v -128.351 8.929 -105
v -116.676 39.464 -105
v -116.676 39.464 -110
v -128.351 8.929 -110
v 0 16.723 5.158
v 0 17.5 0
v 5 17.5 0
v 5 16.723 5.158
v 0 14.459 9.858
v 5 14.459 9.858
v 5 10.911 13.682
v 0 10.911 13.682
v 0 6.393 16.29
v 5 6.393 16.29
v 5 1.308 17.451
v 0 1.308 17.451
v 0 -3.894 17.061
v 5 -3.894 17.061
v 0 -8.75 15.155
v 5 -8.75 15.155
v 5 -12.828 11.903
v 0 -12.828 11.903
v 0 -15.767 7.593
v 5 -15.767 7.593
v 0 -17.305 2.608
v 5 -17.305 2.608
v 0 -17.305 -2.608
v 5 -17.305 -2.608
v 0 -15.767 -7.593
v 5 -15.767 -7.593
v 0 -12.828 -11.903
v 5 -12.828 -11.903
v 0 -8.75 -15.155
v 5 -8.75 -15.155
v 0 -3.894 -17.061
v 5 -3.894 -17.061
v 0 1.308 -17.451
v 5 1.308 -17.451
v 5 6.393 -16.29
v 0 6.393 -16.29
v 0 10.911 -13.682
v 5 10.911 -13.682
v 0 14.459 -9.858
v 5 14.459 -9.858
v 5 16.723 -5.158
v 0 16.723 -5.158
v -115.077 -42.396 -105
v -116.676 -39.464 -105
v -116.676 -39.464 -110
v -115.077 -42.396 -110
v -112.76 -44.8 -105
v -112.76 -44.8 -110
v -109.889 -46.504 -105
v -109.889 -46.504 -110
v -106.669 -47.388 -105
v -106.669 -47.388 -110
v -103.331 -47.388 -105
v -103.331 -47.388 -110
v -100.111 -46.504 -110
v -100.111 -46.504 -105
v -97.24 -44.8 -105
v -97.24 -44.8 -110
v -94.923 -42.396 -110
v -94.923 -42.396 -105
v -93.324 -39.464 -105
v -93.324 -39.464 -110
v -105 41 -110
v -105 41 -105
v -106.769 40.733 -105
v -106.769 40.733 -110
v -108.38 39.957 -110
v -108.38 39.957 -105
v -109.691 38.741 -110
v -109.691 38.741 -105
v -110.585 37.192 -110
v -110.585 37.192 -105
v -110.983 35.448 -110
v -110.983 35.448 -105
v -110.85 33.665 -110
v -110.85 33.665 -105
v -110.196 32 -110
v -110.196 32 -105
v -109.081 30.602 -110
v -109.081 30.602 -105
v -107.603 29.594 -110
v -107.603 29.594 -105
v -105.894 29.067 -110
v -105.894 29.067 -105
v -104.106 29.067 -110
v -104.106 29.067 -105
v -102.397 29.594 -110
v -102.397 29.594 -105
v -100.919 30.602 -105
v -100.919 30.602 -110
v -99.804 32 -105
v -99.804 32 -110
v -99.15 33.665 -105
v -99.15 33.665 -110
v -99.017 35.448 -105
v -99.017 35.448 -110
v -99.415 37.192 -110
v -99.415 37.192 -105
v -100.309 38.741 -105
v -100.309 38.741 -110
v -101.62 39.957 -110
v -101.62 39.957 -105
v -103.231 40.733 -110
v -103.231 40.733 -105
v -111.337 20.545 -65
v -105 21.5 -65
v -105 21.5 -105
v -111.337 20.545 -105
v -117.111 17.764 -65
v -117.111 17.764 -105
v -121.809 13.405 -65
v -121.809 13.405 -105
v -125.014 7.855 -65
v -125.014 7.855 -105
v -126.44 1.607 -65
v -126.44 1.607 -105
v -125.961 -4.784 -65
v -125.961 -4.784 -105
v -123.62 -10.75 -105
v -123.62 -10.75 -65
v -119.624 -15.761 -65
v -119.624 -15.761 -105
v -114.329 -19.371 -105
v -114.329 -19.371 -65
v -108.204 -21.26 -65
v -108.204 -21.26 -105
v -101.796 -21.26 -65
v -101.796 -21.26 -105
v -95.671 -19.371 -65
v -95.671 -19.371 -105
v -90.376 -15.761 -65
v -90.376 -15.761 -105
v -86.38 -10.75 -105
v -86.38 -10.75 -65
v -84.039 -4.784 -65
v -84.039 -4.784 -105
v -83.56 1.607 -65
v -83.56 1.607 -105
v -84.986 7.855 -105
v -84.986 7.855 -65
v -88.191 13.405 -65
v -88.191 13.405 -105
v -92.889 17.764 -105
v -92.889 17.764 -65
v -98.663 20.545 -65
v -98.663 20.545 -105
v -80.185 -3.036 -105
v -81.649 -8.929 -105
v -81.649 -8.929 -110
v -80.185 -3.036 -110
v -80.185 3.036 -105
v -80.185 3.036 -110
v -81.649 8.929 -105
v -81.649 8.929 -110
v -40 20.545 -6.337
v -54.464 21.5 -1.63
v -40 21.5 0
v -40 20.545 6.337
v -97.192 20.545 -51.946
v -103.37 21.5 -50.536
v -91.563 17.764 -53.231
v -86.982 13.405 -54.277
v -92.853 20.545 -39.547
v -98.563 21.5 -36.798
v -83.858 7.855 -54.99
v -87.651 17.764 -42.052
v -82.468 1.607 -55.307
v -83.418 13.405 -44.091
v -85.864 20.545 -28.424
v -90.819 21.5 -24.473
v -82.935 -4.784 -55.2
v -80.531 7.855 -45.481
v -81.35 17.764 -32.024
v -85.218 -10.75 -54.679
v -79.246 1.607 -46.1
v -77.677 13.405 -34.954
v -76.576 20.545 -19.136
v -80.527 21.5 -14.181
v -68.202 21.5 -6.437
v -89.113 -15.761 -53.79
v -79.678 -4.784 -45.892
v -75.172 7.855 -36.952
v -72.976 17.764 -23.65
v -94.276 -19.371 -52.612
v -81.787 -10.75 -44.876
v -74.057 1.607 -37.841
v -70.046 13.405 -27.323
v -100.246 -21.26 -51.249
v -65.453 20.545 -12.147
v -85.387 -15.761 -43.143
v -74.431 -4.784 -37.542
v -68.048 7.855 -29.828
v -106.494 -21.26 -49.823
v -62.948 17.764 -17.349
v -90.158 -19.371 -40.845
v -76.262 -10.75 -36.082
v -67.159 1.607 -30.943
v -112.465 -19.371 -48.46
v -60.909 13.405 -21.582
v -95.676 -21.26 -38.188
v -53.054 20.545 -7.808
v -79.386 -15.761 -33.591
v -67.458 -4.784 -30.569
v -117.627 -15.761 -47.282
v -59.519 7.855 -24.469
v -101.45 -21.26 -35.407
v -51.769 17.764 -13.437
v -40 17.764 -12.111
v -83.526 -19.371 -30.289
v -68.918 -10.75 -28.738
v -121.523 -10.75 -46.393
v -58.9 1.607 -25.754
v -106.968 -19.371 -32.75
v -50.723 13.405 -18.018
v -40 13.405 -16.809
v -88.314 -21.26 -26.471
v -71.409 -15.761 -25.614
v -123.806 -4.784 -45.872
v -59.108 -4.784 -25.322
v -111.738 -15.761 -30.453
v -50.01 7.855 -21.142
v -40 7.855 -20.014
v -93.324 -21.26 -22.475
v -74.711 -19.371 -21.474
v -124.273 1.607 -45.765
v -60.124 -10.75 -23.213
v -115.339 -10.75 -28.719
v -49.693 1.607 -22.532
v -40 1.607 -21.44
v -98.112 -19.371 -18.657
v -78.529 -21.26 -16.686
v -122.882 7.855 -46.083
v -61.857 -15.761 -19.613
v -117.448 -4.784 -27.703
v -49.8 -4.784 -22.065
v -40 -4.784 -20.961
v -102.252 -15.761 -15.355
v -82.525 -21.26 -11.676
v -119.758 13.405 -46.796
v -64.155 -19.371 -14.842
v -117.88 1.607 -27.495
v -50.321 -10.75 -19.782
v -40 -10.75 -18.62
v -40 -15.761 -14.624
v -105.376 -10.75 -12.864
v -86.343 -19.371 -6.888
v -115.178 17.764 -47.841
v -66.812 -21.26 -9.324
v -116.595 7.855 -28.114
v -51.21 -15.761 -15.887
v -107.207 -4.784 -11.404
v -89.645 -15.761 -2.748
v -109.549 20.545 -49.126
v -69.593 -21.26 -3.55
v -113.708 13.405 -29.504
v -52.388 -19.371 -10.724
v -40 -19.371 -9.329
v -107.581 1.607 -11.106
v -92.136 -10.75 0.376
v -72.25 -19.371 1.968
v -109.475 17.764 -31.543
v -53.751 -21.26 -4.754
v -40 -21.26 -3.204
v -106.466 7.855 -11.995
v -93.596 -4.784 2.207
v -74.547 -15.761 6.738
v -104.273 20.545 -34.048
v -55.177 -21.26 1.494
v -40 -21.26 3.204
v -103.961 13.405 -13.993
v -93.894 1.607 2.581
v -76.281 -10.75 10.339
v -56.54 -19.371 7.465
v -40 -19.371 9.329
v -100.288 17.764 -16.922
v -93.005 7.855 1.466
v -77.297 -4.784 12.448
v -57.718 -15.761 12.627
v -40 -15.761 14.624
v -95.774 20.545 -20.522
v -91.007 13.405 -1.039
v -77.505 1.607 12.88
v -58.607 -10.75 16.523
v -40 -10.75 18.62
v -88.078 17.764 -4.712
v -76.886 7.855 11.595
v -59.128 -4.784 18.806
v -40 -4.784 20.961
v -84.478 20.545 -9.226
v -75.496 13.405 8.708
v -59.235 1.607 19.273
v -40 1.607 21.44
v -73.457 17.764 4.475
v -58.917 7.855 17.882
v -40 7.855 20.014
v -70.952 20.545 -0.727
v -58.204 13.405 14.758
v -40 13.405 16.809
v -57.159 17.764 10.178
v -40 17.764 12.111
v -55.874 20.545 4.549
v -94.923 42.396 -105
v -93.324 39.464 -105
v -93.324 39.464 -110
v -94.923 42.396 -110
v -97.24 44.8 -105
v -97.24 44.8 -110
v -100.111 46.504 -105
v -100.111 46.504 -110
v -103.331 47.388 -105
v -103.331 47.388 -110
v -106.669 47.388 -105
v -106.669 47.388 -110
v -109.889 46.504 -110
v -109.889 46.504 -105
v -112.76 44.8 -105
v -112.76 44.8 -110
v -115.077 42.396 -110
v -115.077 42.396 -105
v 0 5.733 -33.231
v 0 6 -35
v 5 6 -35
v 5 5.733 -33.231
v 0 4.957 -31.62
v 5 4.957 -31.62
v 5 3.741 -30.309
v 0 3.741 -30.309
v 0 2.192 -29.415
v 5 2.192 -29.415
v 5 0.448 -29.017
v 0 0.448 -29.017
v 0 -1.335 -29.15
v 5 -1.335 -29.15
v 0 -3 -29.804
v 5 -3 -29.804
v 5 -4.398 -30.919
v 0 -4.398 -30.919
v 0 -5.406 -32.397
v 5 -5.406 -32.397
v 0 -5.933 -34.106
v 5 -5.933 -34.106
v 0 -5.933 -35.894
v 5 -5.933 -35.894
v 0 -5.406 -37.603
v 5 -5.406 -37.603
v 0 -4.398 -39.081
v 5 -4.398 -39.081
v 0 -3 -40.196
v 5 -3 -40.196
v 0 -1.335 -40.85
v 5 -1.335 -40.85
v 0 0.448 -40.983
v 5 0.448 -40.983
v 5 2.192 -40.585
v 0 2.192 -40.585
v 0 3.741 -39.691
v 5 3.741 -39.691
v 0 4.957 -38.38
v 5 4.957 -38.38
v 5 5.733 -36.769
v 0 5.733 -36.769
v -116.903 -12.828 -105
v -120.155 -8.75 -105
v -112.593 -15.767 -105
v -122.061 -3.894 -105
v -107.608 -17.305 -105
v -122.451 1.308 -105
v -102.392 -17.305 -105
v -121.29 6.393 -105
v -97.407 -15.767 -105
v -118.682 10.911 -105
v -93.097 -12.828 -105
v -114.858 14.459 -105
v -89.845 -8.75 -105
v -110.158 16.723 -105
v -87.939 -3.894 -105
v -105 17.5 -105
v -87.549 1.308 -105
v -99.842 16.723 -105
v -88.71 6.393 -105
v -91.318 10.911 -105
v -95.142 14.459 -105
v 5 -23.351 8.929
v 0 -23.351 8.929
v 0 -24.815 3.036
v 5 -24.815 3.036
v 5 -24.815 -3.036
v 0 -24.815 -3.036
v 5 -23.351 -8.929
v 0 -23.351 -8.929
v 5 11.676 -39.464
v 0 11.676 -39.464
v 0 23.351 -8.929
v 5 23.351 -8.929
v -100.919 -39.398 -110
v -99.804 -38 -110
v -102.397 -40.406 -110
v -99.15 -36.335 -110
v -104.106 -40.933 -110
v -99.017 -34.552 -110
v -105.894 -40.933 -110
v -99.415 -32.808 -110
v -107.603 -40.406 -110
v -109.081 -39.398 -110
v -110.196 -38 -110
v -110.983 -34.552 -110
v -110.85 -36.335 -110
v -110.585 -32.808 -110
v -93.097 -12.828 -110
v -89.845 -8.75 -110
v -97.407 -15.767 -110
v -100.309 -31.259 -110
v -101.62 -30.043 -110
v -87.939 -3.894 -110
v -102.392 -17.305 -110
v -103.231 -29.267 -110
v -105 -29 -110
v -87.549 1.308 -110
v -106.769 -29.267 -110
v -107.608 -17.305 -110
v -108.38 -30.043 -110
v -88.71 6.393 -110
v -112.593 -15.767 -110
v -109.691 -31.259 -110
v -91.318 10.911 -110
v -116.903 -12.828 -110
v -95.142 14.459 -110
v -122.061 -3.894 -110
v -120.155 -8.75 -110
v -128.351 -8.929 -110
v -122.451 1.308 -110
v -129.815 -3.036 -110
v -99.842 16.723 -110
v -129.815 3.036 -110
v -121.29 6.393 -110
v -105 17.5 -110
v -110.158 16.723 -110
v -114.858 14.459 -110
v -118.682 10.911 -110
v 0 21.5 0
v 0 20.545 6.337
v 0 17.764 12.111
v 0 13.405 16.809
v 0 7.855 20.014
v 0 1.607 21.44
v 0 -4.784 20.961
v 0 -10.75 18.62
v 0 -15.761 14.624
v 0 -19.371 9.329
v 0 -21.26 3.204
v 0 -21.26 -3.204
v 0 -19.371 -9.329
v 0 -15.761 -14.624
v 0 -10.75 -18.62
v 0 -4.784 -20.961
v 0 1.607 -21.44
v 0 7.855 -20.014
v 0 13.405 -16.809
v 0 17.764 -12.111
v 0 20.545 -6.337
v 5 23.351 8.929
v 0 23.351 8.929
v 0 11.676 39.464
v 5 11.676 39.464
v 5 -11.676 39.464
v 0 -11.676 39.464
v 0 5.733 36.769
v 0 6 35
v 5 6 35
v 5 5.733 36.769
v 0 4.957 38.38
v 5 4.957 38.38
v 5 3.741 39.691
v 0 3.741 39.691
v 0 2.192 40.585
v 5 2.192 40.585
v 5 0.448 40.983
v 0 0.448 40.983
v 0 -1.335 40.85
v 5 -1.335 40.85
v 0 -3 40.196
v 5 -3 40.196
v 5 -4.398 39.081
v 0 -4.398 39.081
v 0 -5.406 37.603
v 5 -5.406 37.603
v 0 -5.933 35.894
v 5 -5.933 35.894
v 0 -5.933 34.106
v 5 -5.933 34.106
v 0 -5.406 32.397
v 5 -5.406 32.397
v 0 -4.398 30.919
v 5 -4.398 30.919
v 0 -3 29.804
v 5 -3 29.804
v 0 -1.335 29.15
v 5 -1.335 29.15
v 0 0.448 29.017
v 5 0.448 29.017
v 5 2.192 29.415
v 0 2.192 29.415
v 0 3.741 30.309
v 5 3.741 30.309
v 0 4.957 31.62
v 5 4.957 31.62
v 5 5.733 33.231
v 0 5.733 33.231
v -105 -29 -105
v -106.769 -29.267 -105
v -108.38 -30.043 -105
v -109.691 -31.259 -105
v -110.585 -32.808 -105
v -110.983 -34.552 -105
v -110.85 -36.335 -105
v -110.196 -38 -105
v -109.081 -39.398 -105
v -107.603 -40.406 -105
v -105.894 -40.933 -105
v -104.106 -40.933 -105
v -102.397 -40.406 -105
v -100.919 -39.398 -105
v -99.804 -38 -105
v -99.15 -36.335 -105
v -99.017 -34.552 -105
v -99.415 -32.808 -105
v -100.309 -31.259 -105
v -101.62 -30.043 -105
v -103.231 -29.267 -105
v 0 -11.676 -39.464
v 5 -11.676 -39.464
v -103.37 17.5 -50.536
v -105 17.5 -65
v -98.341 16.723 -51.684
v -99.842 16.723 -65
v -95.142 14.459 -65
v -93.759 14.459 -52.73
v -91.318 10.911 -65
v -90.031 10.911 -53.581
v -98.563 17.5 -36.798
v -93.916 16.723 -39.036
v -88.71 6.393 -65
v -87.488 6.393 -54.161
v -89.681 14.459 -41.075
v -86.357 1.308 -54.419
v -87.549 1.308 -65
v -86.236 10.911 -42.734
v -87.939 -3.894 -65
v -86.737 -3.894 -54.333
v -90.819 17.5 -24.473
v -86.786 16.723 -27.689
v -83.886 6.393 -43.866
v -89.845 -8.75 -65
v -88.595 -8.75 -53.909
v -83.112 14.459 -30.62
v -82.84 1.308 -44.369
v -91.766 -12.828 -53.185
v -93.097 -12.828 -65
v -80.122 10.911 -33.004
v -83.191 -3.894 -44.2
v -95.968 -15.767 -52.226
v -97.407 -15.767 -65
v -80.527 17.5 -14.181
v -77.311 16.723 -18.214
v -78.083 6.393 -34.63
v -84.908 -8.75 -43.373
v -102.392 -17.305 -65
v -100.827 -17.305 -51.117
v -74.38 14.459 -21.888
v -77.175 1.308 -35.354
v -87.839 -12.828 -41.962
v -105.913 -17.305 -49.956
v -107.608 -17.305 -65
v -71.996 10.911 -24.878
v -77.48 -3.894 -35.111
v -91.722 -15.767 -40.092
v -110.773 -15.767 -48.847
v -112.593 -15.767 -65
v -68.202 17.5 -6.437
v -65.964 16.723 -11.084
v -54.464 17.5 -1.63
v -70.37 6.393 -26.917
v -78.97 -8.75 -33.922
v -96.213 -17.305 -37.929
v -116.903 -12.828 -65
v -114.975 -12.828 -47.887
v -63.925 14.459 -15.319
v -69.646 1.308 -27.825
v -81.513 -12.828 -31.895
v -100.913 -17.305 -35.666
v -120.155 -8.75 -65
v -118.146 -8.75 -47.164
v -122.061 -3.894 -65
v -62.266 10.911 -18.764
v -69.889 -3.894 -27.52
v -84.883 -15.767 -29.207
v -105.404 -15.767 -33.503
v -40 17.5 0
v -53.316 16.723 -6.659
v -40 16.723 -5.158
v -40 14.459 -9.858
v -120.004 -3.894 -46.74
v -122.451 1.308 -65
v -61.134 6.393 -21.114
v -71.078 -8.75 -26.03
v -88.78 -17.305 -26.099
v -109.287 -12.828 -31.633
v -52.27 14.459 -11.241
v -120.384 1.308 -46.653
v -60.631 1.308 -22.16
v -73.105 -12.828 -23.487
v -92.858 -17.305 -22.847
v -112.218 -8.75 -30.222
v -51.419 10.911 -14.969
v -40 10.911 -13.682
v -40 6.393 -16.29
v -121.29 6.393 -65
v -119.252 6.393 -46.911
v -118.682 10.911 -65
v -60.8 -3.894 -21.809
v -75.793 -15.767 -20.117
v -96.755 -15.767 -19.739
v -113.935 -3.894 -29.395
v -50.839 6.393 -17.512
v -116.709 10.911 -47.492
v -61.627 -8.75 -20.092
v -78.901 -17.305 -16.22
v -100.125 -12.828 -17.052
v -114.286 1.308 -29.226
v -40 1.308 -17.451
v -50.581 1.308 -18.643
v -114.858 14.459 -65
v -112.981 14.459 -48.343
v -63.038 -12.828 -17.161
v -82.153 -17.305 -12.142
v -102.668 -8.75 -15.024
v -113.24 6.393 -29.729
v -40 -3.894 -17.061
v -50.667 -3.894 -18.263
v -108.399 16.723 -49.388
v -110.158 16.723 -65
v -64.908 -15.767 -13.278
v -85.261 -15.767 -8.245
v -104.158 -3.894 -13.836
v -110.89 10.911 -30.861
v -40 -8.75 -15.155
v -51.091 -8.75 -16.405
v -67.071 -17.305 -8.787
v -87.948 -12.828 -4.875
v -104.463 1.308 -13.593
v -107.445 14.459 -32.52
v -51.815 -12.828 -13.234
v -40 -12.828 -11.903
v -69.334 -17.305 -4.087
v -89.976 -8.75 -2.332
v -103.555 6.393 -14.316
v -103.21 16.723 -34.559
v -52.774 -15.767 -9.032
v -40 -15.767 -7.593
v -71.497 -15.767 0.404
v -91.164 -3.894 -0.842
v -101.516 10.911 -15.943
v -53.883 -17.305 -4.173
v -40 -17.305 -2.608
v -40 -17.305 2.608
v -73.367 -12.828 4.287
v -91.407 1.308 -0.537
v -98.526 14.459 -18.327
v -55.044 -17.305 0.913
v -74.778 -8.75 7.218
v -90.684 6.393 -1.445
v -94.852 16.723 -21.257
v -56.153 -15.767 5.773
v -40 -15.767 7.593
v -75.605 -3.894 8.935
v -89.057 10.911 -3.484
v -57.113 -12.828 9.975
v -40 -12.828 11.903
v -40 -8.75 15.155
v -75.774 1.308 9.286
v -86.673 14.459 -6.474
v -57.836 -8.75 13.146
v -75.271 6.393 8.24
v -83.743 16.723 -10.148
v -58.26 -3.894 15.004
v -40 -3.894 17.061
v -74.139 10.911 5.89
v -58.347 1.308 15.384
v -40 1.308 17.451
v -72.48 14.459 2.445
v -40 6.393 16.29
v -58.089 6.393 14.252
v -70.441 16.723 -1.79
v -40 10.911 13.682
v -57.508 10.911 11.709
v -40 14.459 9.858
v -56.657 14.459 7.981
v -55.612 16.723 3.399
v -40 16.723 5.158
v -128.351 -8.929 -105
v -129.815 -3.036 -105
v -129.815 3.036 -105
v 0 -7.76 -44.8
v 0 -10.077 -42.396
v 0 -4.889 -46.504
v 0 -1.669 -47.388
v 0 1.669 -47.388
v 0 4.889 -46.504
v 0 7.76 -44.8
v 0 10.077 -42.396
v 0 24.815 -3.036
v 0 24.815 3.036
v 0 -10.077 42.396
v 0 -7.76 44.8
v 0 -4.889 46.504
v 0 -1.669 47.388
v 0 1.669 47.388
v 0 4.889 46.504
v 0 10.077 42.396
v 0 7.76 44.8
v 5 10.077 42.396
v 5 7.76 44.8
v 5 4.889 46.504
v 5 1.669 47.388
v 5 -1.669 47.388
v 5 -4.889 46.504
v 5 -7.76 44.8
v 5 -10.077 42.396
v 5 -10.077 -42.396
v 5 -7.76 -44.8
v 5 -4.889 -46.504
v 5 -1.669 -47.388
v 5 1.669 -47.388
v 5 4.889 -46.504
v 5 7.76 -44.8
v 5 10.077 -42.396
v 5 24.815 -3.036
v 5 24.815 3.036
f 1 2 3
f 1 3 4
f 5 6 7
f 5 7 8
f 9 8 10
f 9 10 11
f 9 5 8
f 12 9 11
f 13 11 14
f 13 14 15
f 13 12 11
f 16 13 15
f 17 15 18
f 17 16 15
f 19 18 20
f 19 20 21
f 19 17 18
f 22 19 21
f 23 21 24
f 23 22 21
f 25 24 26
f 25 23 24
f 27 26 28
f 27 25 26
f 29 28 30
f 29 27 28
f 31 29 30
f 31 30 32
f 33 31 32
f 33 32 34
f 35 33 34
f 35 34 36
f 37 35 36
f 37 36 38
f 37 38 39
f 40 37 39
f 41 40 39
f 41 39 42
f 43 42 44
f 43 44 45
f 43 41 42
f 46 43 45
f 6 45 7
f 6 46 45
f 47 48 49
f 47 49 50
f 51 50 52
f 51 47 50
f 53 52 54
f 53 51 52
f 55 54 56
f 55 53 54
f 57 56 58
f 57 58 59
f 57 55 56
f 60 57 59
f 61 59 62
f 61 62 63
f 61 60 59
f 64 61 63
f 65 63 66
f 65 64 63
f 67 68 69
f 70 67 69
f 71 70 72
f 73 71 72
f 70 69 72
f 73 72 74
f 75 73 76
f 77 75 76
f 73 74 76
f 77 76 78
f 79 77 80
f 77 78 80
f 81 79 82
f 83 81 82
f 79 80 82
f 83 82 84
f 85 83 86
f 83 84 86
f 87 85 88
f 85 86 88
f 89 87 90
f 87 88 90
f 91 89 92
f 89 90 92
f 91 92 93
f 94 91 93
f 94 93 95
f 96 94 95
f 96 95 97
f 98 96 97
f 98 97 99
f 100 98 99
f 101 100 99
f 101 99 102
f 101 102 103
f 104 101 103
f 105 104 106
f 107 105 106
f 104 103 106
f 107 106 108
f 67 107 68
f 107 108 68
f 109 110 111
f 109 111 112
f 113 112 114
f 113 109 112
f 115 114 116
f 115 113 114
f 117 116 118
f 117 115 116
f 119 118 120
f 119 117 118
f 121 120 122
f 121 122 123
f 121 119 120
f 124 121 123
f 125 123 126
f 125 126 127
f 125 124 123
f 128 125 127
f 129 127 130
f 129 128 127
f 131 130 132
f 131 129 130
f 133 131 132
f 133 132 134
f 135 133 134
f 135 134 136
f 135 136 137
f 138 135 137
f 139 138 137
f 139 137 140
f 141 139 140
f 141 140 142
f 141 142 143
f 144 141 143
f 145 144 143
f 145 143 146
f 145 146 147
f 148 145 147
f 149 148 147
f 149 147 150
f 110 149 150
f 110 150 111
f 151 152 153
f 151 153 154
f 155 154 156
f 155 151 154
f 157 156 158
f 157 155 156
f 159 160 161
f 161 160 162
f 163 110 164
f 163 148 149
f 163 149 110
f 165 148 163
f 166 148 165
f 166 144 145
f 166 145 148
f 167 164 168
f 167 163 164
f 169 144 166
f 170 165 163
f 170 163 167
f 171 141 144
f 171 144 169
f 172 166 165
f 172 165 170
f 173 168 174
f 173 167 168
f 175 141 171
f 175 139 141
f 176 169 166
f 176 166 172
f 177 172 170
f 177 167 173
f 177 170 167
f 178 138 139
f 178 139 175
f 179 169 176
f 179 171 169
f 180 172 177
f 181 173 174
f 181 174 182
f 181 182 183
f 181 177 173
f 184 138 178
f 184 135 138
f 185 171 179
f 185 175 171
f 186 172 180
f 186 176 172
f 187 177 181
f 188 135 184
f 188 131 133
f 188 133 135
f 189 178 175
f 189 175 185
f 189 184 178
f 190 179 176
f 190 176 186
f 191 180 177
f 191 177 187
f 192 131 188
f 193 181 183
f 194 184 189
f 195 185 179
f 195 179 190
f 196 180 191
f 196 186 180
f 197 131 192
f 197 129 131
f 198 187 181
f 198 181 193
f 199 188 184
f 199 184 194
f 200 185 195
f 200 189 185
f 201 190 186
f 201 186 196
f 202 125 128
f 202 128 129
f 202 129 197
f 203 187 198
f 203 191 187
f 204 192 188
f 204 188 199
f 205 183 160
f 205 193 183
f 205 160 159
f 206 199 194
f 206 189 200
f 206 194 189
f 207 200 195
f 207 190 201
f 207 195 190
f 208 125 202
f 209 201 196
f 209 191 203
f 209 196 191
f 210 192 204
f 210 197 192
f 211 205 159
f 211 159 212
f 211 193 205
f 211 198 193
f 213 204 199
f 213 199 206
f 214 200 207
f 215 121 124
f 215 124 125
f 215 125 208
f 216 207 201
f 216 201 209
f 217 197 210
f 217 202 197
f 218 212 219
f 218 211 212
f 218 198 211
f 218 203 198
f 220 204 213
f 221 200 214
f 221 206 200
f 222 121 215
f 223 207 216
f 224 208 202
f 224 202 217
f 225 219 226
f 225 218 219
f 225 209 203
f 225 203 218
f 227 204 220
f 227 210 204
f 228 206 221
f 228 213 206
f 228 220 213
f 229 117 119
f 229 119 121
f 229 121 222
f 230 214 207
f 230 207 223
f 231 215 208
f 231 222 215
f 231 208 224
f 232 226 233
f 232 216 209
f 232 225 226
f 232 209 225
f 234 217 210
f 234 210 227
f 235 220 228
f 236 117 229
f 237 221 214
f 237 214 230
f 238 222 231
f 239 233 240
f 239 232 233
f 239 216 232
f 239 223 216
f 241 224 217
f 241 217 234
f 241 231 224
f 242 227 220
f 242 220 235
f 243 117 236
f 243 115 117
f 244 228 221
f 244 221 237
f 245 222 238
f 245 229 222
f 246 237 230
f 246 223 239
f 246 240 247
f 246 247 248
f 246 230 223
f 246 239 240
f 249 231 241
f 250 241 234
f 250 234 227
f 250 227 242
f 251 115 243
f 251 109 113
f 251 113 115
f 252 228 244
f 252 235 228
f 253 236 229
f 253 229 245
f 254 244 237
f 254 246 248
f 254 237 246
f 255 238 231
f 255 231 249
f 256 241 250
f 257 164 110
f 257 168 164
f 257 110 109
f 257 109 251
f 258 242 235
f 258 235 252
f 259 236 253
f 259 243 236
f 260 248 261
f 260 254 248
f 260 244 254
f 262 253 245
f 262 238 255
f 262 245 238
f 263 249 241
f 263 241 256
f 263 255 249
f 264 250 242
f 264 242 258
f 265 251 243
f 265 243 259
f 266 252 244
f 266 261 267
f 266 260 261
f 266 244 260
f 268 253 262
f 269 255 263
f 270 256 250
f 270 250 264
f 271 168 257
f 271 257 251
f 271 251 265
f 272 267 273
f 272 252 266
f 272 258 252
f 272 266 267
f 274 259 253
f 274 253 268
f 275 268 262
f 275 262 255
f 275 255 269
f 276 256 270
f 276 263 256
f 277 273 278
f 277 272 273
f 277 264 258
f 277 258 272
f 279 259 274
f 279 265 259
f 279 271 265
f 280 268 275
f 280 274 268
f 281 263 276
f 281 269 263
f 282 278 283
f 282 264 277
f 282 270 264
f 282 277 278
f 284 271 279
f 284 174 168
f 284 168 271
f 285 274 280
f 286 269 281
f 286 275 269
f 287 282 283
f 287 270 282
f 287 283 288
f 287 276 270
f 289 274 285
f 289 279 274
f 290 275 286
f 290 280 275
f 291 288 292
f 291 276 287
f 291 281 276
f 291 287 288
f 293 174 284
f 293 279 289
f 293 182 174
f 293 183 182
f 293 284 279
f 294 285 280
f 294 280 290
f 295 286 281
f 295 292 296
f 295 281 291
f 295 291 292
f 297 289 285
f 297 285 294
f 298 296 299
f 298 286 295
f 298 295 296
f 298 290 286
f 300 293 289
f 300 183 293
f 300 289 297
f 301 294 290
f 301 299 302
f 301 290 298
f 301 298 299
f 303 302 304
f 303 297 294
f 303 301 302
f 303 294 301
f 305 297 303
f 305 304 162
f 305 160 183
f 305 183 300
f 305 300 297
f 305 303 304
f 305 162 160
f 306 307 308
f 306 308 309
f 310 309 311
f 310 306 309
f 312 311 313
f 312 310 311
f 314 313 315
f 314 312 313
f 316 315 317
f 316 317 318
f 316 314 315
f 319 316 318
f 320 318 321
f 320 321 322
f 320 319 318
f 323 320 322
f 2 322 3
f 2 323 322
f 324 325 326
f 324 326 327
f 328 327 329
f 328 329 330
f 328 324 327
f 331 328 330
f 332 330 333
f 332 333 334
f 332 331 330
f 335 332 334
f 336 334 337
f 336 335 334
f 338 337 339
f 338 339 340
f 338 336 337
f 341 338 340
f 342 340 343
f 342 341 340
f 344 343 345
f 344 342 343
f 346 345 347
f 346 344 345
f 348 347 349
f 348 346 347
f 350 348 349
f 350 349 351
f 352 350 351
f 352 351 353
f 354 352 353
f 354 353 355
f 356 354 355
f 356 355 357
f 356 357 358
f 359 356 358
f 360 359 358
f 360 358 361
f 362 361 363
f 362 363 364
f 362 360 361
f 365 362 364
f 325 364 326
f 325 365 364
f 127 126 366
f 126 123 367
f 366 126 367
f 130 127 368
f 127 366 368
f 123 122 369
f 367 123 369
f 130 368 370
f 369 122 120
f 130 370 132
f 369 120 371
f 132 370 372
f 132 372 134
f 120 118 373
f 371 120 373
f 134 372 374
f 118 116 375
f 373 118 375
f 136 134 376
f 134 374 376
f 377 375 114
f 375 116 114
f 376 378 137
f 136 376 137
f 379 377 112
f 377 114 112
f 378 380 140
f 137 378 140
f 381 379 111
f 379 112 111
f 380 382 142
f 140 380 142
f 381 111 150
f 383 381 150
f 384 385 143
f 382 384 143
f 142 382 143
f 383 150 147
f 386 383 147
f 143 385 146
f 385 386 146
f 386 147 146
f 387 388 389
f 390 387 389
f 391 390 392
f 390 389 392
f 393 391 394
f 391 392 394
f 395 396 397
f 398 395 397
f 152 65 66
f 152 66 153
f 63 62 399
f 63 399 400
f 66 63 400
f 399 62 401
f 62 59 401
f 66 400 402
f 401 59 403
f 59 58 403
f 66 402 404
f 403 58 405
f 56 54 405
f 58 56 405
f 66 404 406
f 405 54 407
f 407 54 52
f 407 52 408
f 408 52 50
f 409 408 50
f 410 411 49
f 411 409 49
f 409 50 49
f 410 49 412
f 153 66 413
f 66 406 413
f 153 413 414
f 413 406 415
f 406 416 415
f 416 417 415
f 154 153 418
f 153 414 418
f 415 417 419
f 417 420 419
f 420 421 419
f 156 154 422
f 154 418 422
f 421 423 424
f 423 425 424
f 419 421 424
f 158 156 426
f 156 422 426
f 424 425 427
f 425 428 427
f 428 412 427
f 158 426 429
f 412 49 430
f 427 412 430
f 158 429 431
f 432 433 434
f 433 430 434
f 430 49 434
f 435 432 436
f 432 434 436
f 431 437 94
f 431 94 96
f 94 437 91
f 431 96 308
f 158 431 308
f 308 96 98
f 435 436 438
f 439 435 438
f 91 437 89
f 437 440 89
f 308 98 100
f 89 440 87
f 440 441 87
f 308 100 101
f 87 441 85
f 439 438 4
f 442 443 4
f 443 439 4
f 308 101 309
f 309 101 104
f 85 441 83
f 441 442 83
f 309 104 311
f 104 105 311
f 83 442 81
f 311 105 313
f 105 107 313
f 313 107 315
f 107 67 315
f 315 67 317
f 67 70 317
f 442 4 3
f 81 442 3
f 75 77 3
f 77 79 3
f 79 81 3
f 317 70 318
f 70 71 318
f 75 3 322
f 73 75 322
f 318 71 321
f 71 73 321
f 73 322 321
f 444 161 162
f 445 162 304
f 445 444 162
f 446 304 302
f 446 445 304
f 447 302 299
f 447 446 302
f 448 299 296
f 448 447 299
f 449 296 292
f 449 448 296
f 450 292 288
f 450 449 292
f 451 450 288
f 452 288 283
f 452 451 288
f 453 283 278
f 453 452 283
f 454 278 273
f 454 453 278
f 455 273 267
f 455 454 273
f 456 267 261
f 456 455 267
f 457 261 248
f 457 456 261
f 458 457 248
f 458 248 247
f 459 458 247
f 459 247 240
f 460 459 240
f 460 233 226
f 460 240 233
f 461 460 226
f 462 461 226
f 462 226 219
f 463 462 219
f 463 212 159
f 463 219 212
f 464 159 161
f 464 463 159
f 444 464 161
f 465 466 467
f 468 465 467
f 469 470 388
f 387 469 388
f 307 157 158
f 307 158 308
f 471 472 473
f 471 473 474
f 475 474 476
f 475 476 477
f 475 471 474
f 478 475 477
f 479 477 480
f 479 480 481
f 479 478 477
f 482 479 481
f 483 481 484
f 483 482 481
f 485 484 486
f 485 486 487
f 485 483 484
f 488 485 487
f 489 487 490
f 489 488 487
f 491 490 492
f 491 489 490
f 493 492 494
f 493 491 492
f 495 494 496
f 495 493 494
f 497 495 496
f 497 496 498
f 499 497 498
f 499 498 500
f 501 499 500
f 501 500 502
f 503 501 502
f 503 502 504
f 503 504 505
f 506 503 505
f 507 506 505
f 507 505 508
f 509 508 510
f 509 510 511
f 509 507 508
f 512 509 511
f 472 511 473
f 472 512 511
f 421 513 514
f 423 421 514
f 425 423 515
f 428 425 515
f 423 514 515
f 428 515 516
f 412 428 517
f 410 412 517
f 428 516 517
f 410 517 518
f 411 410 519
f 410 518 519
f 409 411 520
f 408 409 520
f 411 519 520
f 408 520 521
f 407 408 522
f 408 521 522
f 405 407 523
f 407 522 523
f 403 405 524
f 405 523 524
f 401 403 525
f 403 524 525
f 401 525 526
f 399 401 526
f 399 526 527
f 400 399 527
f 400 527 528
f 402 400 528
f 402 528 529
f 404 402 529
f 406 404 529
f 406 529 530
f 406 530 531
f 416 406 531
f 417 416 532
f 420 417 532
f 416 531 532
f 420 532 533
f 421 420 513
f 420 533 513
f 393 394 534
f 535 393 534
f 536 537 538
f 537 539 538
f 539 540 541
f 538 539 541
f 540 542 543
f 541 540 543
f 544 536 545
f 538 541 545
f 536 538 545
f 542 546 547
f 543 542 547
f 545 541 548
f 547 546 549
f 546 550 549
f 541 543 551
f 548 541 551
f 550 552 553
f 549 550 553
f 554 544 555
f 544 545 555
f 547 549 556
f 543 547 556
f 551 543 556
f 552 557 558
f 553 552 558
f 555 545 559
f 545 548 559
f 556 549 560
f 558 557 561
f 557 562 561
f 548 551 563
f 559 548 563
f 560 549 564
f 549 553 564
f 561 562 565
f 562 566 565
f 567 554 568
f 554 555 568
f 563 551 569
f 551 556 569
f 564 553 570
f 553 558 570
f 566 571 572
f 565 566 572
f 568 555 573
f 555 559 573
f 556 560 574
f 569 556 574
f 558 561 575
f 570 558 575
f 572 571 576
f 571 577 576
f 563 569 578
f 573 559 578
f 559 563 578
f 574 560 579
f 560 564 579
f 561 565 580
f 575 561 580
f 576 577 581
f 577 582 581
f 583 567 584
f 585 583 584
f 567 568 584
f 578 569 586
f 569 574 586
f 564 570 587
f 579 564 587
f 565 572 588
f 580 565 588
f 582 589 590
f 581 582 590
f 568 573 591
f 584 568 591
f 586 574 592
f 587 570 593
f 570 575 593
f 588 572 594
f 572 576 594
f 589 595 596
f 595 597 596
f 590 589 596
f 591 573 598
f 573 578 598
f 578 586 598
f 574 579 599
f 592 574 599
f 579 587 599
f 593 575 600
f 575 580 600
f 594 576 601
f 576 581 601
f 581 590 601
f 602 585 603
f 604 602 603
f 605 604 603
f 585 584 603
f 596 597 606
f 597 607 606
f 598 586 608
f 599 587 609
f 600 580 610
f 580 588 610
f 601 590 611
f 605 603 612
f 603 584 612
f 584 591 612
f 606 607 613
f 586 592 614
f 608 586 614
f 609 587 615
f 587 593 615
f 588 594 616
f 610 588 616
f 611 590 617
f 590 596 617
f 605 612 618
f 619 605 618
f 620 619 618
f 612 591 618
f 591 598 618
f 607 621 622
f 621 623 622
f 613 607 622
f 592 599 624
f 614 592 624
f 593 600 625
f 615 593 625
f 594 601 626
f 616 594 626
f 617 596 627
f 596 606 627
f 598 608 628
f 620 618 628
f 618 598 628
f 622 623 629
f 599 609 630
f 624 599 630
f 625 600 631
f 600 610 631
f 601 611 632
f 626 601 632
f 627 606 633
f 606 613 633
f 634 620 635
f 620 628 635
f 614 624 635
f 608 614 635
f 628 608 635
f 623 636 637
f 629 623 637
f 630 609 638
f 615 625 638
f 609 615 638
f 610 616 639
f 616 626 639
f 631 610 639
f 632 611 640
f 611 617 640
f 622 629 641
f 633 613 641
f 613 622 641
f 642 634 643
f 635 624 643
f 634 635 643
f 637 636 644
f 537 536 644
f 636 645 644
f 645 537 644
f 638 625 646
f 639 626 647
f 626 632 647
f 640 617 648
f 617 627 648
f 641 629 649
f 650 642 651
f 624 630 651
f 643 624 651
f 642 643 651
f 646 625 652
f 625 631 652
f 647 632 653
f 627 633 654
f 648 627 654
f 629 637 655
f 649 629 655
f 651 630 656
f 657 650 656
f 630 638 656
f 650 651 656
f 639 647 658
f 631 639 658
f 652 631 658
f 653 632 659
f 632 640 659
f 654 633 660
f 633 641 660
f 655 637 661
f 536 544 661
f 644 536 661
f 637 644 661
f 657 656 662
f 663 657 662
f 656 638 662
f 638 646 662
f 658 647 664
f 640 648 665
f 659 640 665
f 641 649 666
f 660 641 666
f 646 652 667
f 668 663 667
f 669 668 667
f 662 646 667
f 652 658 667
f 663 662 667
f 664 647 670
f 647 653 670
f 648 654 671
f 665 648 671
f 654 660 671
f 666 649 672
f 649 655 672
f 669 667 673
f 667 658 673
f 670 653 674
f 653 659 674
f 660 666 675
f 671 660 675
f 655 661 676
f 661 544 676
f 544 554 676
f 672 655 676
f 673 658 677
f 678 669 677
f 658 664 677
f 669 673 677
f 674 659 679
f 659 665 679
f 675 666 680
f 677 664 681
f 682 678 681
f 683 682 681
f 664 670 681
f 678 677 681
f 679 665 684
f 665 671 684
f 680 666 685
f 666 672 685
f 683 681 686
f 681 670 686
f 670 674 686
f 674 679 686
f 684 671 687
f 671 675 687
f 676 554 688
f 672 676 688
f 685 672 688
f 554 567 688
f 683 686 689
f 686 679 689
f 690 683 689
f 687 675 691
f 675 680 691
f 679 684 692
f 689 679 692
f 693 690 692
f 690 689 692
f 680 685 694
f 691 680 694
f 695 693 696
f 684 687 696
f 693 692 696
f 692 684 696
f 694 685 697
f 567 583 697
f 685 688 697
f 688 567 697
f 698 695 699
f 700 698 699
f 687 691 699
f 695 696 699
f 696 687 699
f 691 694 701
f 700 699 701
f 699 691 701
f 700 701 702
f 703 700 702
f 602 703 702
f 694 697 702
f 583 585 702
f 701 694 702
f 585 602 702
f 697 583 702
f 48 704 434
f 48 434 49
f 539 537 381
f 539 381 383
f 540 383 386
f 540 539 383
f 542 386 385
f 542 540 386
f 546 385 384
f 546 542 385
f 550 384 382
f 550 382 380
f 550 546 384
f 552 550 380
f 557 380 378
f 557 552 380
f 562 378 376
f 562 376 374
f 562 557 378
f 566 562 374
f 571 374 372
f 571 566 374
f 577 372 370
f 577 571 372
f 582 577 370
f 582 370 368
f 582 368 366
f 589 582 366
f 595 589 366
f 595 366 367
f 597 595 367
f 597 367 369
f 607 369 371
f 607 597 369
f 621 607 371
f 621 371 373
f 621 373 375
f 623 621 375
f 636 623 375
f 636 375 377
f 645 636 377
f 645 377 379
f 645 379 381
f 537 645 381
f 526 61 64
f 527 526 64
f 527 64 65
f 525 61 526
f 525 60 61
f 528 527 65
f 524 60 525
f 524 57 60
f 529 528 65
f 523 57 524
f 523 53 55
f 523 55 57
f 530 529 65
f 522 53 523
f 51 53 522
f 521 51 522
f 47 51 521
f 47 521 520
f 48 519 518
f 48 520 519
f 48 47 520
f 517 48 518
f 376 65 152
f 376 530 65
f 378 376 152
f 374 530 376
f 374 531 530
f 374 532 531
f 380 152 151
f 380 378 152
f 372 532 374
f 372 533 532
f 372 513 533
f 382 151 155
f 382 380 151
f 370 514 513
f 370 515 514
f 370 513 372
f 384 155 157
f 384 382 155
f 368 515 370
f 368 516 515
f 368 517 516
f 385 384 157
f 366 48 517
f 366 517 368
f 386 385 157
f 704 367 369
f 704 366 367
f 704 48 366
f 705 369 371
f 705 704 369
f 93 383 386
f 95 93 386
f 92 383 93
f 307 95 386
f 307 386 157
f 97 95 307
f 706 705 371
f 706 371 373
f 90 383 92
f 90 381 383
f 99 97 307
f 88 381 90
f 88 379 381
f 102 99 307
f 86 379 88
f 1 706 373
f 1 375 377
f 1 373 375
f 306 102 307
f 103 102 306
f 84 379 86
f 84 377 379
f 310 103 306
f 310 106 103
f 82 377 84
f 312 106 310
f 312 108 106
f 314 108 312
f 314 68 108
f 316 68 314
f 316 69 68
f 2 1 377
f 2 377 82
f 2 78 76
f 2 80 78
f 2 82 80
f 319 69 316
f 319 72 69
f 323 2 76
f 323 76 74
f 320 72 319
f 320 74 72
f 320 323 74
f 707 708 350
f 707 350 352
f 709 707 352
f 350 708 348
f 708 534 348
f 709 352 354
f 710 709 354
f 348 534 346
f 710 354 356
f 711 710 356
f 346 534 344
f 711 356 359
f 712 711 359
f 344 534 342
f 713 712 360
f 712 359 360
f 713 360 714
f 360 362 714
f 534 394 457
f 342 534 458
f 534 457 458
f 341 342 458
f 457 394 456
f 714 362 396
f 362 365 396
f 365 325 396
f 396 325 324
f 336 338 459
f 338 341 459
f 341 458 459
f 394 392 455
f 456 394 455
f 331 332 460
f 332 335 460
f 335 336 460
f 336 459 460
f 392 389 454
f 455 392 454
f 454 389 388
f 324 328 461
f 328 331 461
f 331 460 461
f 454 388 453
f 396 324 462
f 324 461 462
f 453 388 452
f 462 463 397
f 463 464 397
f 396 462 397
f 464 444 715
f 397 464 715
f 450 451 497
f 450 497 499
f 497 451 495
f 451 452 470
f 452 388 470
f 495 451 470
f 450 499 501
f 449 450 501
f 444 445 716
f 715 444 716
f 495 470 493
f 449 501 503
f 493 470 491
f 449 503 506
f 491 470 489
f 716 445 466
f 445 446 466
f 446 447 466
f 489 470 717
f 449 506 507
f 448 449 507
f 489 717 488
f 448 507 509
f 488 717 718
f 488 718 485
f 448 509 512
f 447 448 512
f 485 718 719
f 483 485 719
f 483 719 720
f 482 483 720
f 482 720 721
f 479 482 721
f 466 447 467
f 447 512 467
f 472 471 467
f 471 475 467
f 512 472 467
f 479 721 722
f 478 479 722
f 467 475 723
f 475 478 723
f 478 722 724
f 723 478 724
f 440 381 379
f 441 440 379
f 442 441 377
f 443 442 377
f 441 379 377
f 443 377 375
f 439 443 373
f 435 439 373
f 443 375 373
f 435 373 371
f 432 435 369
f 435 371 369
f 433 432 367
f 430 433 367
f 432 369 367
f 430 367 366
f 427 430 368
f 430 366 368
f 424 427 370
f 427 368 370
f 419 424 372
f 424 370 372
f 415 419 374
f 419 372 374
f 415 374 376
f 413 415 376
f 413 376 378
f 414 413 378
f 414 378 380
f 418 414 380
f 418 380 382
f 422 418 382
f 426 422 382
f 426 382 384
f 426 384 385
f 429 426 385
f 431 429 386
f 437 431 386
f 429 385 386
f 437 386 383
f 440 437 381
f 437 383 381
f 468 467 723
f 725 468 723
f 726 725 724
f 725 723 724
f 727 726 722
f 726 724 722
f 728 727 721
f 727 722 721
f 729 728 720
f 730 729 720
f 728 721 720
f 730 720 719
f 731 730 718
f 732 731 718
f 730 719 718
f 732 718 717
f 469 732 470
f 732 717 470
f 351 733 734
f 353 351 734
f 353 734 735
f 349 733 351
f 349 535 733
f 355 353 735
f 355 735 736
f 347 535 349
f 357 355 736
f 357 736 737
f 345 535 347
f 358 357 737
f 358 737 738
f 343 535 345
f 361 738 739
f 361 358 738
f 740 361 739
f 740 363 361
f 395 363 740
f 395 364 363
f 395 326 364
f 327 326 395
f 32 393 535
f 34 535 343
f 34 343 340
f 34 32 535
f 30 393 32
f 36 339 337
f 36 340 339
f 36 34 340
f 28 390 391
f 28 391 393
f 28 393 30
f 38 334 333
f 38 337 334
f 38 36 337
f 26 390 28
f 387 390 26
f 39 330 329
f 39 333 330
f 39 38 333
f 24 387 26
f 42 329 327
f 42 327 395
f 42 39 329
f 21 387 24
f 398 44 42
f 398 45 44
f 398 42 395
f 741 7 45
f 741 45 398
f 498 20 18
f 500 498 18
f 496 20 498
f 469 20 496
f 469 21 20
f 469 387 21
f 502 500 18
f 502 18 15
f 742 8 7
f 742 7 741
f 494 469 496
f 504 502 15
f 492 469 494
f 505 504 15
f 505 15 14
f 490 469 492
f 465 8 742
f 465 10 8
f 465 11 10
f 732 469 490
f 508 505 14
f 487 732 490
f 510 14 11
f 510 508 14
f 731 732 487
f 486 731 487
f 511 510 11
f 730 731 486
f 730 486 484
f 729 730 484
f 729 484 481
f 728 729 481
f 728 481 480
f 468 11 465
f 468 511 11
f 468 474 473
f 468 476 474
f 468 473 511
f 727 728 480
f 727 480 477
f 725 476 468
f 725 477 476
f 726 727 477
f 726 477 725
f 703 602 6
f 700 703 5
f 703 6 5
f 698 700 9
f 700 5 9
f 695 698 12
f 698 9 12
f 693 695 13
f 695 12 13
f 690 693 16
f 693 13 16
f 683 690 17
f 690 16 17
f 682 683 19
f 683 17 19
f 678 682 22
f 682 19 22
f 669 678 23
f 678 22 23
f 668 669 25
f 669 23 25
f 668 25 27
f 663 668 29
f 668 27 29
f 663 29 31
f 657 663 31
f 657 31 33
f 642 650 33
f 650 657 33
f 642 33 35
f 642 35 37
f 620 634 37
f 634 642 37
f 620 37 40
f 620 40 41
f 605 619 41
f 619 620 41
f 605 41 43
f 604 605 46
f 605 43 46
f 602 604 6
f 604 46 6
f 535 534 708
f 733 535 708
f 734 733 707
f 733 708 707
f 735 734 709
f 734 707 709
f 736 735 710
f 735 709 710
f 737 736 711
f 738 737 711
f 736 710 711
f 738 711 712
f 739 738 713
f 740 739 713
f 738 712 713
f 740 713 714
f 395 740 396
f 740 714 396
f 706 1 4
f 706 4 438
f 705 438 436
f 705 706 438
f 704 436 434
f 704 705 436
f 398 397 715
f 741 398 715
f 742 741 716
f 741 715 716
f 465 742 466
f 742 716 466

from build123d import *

# Parameters (mm, degrees)
SKETCH001_R   = 21.5
SKETCH001_R_2 = 17.5
SKETCH002_R   = 6
SKETCH002_R_2 = 17.5
PAD_DEPTH     = 5
BINDER_R      = 17.5
BINDER_R_2    = 6
EXTRUDE_DEPTH = 5


with BuildPart() as body:
    # AdditivePipe: sweep along a path in Sketch
    with BuildLine(Plane.XZ) as additivepipe_path:
        Line((-105, -105), (-105, -65))
        ThreePointArc((-105, -65), (-85.961941, -19.038059), (-40, 0))
        Line((-40, 0), (0, 0))
    # Sketch001 → AdditivePipe (sweep)
    with BuildSketch(Plane.YZ):
        Circle(SKETCH001_R)
        Circle(SKETCH001_R_2, mode=Mode.SUBTRACT)
    sweep(path=additivepipe_path.line)

    # Sketch002 (on Face5 of AdditivePipe) → Pad (new body)
    with BuildSketch(Plane.YZ):
        with BuildLine():
            Line((-11.675622, 39.464286), (-23.351244, 8.928571))
            ThreePointArc((-23.351244, 8.928571), (-25, 0), (-23.351244, -8.928571))
            Line((-23.351244, -8.928571), (-11.675622, -39.464286))
            ThreePointArc((-11.675622, -39.464286), (0, -47.5), (11.675622, -39.464286))
            Line((11.675622, -39.464286), (23.351244, -8.928571))
            ThreePointArc((23.351244, -8.928571), (25, 0), (23.351244, 8.928571))
            Line((23.351244, 8.928571), (11.675622, 39.464286))
            ThreePointArc((11.675622, 39.464286), (0, 47.5), (-11.675622, 39.464286))
        make_face()
        with Locations((0, 35)):
            Circle(SKETCH002_R, mode=Mode.SUBTRACT)
        with Locations((0, -35)):
            Circle(SKETCH002_R, mode=Mode.SUBTRACT)
        Circle(SKETCH002_R_2, mode=Mode.SUBTRACT)
    extrude(amount=PAD_DEPTH)


with BuildPart() as extrude_body:
    # Binder → Extrude (new body)
    with BuildSketch(Plane(origin=(-105, 0, -105), x_dir=(0, 1, 0), z_dir=(0, 0, 1))):
        with BuildLine():
            Line((-39.464286, -11.675622), (-8.928571, -23.351244))
            ThreePointArc((-8.928571, -23.351244), (0, -25), (8.928571, -23.351244))
            Line((8.928571, -23.351244), (39.464286, -11.675622))
            ThreePointArc((39.464286, -11.675622), (47.5, 0), (39.464286, 11.675622))
            Line((39.464286, 11.675622), (8.928571, 23.351244))
            ThreePointArc((8.928571, 23.351244), (0, 25), (-8.928571, 23.351244))
            Line((-8.928571, 23.351244), (-39.464286, 11.675622))
            ThreePointArc((-39.464286, 11.675622), (-47.5, 0), (-39.464286, -11.675622))
        make_face()
        Circle(BINDER_R, mode=Mode.SUBTRACT)
        with Locations((35, 0)):
            Circle(BINDER_R_2, mode=Mode.SUBTRACT)
        with Locations((-35, 0)):
            Circle(BINDER_R_2, mode=Mode.SUBTRACT)
    extrude(amount=-EXTRUDE_DEPTH)


solid = Compound([body.part, extrude_body.part])
